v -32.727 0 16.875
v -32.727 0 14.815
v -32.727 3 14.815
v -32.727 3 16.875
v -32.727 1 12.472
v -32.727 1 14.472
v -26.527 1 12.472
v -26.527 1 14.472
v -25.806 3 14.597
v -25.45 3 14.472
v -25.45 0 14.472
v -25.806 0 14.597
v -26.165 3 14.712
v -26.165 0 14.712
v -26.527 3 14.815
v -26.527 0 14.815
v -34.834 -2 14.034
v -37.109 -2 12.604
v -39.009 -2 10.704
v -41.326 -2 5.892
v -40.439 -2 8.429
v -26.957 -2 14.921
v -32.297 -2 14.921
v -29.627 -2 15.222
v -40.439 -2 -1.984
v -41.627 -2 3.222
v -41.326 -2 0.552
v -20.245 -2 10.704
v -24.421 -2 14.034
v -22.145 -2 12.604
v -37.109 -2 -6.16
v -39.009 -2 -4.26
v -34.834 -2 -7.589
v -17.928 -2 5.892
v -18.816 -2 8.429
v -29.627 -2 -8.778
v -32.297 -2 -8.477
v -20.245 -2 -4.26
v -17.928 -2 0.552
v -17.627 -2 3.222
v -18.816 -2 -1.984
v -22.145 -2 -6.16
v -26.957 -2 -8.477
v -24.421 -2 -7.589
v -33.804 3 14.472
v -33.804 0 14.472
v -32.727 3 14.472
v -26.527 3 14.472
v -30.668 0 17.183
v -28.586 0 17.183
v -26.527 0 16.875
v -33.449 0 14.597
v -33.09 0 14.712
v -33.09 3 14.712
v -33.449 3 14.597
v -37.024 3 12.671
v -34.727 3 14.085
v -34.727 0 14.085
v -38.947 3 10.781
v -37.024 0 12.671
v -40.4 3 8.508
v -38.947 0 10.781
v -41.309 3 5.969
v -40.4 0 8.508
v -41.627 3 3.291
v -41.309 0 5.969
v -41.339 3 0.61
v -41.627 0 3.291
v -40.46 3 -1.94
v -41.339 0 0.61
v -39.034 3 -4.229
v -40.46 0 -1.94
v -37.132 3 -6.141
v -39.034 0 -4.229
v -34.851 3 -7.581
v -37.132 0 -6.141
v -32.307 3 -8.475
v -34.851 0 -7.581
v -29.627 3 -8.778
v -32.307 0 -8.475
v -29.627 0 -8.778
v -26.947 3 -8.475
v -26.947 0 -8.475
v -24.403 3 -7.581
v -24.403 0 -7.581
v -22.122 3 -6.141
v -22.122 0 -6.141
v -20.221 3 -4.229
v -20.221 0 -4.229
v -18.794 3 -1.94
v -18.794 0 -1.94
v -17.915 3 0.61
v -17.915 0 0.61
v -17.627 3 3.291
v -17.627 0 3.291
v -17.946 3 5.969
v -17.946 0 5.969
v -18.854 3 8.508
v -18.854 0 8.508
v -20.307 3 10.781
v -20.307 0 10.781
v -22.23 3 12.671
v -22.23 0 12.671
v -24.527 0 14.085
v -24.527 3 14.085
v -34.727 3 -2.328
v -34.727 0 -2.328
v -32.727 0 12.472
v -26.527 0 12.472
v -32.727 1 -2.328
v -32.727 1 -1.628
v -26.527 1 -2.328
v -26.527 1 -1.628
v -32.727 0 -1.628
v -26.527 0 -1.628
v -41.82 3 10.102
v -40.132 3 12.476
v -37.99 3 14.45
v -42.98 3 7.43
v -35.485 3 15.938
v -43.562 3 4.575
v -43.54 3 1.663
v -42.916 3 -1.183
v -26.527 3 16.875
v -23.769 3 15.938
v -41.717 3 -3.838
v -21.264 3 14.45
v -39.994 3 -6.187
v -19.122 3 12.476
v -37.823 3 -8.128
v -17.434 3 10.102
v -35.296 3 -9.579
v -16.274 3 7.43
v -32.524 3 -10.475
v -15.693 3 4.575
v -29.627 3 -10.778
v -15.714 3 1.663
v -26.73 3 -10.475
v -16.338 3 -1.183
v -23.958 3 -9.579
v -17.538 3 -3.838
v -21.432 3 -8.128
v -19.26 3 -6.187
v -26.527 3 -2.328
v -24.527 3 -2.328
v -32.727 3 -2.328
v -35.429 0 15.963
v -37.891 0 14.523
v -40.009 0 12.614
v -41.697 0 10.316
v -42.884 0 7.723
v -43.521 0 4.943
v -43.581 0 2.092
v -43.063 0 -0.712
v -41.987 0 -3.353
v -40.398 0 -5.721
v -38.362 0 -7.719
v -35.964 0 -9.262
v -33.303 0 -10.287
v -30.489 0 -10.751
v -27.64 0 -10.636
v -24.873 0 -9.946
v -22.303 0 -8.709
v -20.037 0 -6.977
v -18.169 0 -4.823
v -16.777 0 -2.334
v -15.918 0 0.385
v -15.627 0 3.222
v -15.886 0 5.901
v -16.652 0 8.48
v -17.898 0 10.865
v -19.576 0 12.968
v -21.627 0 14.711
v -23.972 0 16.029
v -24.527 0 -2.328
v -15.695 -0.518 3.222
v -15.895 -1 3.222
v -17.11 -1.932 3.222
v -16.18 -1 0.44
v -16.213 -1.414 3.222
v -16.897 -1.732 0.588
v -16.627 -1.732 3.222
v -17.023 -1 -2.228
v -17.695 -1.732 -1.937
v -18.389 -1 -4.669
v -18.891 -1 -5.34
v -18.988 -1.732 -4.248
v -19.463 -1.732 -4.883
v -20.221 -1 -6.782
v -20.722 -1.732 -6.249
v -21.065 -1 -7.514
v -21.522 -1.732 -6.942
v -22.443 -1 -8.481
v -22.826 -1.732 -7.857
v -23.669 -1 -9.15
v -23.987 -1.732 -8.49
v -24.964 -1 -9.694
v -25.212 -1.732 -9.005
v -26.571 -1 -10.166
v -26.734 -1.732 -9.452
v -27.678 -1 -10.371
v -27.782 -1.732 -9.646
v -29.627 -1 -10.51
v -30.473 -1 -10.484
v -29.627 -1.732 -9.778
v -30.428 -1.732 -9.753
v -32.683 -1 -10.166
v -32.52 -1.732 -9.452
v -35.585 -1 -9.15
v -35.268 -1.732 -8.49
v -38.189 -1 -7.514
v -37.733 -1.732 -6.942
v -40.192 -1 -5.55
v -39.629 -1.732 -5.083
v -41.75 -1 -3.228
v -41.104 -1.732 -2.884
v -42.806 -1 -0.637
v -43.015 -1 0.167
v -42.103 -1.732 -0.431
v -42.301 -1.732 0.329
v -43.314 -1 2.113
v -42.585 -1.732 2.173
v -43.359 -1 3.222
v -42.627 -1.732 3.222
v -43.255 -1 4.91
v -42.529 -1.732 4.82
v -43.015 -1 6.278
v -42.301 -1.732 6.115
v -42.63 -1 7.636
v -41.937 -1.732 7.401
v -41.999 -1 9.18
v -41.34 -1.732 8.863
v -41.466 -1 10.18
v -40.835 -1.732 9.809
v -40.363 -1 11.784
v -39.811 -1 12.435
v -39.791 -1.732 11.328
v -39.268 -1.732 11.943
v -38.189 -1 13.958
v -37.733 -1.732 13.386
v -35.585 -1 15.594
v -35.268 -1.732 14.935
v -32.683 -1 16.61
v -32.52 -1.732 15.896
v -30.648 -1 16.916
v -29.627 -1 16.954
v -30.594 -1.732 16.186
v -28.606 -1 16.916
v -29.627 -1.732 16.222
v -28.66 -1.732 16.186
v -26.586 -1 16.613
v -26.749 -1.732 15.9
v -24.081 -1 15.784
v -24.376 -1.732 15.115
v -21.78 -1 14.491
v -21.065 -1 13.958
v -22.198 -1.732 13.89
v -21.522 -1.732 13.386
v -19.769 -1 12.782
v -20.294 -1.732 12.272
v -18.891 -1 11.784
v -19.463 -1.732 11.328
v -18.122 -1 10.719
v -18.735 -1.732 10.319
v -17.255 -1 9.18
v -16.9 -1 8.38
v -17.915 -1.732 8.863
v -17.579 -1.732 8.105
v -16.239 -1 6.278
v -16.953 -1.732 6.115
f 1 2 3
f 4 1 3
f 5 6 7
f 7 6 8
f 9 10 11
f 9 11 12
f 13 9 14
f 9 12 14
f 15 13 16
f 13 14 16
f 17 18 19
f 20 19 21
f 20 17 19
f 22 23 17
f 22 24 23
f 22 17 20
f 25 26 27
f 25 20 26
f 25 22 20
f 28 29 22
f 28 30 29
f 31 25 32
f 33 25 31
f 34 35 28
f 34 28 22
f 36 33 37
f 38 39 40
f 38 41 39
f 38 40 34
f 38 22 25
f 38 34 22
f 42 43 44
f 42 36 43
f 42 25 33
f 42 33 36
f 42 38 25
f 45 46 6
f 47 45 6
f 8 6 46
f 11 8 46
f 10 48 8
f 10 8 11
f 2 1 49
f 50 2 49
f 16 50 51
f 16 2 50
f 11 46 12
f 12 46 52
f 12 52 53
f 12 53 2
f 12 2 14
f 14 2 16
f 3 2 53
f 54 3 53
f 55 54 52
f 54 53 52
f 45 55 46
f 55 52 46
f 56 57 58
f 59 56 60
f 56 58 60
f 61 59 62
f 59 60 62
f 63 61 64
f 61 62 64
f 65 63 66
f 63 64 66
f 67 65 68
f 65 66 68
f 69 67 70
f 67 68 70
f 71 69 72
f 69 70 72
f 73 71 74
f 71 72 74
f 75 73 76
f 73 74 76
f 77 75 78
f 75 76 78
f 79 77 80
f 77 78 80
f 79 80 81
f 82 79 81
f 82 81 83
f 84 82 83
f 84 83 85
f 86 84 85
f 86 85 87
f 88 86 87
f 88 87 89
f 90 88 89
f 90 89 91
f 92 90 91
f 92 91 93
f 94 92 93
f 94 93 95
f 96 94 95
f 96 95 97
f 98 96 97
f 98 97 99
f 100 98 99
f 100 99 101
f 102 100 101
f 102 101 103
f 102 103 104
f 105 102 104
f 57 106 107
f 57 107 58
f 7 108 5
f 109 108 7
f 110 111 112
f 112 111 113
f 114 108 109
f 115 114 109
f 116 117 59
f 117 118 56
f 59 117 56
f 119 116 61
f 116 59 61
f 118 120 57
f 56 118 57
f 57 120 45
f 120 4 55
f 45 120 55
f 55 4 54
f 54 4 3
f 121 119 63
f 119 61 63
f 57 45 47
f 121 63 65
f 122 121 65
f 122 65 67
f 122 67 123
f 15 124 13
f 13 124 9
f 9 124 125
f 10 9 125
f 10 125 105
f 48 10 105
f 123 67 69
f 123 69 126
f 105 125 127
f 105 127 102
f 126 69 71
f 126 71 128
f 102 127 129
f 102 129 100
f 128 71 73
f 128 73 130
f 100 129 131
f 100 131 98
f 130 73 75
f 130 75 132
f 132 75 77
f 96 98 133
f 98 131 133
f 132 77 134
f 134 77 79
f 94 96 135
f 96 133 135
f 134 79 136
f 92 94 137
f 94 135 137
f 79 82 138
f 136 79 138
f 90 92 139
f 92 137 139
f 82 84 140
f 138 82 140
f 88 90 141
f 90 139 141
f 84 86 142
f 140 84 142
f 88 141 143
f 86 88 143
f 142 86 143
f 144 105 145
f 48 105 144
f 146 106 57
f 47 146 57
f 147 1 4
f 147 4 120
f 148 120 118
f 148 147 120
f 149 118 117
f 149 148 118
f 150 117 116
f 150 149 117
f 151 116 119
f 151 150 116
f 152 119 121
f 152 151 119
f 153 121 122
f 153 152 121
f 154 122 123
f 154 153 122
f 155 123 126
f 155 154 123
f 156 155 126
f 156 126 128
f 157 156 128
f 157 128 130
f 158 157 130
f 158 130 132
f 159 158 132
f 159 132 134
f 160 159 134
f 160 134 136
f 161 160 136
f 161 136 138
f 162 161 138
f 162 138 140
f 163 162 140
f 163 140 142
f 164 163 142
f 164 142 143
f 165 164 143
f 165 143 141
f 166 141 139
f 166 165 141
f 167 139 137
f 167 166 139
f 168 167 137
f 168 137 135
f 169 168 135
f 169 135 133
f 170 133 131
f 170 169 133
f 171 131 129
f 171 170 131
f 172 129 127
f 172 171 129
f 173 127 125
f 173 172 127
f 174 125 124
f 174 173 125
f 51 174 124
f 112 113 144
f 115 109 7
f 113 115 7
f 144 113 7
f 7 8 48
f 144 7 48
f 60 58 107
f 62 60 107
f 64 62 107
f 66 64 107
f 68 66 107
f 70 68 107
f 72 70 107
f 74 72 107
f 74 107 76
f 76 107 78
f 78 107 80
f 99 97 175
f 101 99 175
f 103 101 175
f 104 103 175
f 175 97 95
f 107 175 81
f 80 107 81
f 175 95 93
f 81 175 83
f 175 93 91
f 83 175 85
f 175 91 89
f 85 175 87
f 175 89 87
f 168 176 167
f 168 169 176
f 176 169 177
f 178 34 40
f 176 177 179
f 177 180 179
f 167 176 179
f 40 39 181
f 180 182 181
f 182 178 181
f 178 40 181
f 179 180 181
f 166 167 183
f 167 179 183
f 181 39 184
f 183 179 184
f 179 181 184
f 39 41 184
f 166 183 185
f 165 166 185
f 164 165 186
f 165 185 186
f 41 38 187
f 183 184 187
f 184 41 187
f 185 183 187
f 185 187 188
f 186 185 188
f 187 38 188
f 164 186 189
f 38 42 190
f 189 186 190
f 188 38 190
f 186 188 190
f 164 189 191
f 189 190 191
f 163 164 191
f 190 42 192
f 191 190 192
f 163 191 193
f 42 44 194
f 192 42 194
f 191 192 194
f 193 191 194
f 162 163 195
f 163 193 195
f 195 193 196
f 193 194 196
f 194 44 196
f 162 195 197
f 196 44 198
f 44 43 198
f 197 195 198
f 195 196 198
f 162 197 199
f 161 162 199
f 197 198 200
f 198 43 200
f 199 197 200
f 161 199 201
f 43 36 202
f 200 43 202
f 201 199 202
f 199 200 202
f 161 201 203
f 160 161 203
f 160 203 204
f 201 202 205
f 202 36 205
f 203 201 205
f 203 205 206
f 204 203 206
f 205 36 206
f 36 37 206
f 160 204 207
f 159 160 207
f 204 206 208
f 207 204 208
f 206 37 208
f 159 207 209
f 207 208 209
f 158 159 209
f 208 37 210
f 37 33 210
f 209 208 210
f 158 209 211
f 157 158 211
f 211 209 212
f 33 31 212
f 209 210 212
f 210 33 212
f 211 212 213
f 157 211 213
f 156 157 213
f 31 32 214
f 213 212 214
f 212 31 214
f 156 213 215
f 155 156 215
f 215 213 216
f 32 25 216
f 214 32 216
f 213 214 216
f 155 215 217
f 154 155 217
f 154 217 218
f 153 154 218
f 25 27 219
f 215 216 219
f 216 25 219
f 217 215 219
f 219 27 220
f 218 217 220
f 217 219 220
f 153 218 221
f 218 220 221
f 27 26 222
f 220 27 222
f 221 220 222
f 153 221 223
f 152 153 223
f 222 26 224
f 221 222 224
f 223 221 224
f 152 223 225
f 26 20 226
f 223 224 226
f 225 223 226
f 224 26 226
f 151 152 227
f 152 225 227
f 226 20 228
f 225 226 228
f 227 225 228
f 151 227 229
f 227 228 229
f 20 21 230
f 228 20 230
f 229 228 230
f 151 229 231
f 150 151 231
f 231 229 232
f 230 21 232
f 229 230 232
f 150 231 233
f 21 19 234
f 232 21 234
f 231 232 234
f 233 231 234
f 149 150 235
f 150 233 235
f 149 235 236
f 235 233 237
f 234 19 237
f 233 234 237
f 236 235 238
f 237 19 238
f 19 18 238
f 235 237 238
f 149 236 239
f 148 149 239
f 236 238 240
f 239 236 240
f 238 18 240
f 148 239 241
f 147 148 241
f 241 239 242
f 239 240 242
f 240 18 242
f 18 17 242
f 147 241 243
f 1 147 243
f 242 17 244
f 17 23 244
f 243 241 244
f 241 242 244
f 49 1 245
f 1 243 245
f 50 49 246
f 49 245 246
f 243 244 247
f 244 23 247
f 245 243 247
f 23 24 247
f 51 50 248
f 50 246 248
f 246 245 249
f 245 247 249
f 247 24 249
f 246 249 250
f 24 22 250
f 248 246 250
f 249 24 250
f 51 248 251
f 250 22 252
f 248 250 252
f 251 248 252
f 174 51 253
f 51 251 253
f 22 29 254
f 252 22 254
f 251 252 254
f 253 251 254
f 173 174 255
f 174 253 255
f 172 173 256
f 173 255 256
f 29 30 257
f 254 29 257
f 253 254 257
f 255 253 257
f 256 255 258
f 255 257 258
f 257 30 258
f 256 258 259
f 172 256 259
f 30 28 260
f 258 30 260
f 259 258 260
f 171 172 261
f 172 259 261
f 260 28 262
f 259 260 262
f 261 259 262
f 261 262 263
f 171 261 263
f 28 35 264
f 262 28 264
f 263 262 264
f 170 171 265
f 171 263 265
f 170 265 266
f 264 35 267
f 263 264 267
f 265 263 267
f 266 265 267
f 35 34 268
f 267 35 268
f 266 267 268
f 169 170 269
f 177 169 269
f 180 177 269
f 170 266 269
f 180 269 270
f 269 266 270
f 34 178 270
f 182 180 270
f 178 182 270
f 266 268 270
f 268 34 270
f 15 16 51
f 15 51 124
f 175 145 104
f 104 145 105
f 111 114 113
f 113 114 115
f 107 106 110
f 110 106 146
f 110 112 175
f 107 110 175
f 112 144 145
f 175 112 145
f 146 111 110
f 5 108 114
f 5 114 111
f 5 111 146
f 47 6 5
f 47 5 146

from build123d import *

# Parameters (mm, degrees)
SKETCH1_W           = 10.2
SKETCH1_H           = 16.8
SKETCH1_W_2         = 6.2
SKETCH1_H_2         = 14.1
BOSS_EXTRUDE1_DEPTH = 3
SKETCH2_W           = 6.2
SKETCH2_H           = 2
CUT_EXTRUDE1_DEPTH  = 25.4
SKETCH3_W           = 10.2
SKETCH3_H           = 16.8
BOSS_EXTRUDE2_DEPTH = 2
SKETCH4_R           = 14
SKETCH4_R_2         = 12
BOSS_EXTRUDE4_DEPTH = 5
SKETCH5_R           = 14
BOSS_EXTRUDE5_DEPTH = 2
SKETCH6_W           = 6.2
SKETCH6_H           = 3
CUT_EXTRUDE2_DEPTH  = 7.62


with BuildPart() as part:
    # Sketch1 → Boss-Extrude1 (new body)
    with BuildSketch(Plane(origin=(0, 0, 0), x_dir=(1, 0, 0), z_dir=(0, 1, 0))):
        with Locations((-29.627149571, -6.071905286)):
            Rectangle(SKETCH1_W, SKETCH1_H)
        with Locations((-29.627149571, -5.421905286)):
            Rectangle(SKETCH1_W_2, SKETCH1_H_2, mode=Mode.SUBTRACT)
    extrude(amount=BOSS_EXTRUDE1_DEPTH)

    # Sketch2 → Cut-Extrude1 (cut)
    with BuildSketch(Plane.XY.offset(14.471905286)):
        with Locations((-29.627149571, 2)):
            Rectangle(SKETCH2_W, SKETCH2_H)
    extrude(amount=-CUT_EXTRUDE1_DEPTH, mode=Mode.SUBTRACT)

    # Sketch3 → Boss-Extrude2 (add)
    with BuildSketch(Plane.XZ):
        with Locations((-29.627149571, 6.071905286)):
            Rectangle(SKETCH3_W, SKETCH3_H)
    extrude(amount=BOSS_EXTRUDE2_DEPTH)

    # Sketch4 → Boss-Extrude4 (add)
    with BuildSketch(Plane.XZ.offset(2)):
        with Locations(Location((-29.627149571, 3.222245286, 0), (0, 0, 270))):
            Circle(SKETCH4_R)
        with Locations((-29.627149571, 3.222245286)):
            Circle(SKETCH4_R_2, mode=Mode.SUBTRACT)
    extrude(amount=-BOSS_EXTRUDE4_DEPTH)

    # Sketch5 → Boss-Extrude5 (add)
    with BuildSketch(Plane.XZ.offset(2)):
        with Locations(Location((-29.627149571, 3.222245286, 0), (0, 0, 270))):
            Circle(SKETCH5_R)
    extrude(amount=-BOSS_EXTRUDE5_DEPTH)

    # Sketch6 → Cut-Extrude2 (cut)
    with BuildSketch(Plane.XY.offset(14.471905286)):
        with Locations((-29.627149571, 1.5)):
            Rectangle(SKETCH6_W, SKETCH6_H)
    extrude(amount=CUT_EXTRUDE2_DEPTH, mode=Mode.SUBTRACT)

    # Fillet2: read off the stored shape, not the designer's step
    # Fillet2 outline → Fillet2 (revolve, cut)
    with BuildSketch(Plane(origin=(-29.627149571, 0, 3.222245286), x_dir=(1, 0, 0), z_dir=(0, 0, 1))):
        with BuildLine():
            Line((14, -2), (14, 0))
            ThreePointArc((14, 0), (13.414213562, -1.414213562), (12, -2))
            Line((12, -2), (14, -2))
        make_face()
    revolve(axis=Axis((-29.627149571, 0, 3.222245286), (0, 1, 0)), mode=Mode.SUBTRACT)


solid = part.part
